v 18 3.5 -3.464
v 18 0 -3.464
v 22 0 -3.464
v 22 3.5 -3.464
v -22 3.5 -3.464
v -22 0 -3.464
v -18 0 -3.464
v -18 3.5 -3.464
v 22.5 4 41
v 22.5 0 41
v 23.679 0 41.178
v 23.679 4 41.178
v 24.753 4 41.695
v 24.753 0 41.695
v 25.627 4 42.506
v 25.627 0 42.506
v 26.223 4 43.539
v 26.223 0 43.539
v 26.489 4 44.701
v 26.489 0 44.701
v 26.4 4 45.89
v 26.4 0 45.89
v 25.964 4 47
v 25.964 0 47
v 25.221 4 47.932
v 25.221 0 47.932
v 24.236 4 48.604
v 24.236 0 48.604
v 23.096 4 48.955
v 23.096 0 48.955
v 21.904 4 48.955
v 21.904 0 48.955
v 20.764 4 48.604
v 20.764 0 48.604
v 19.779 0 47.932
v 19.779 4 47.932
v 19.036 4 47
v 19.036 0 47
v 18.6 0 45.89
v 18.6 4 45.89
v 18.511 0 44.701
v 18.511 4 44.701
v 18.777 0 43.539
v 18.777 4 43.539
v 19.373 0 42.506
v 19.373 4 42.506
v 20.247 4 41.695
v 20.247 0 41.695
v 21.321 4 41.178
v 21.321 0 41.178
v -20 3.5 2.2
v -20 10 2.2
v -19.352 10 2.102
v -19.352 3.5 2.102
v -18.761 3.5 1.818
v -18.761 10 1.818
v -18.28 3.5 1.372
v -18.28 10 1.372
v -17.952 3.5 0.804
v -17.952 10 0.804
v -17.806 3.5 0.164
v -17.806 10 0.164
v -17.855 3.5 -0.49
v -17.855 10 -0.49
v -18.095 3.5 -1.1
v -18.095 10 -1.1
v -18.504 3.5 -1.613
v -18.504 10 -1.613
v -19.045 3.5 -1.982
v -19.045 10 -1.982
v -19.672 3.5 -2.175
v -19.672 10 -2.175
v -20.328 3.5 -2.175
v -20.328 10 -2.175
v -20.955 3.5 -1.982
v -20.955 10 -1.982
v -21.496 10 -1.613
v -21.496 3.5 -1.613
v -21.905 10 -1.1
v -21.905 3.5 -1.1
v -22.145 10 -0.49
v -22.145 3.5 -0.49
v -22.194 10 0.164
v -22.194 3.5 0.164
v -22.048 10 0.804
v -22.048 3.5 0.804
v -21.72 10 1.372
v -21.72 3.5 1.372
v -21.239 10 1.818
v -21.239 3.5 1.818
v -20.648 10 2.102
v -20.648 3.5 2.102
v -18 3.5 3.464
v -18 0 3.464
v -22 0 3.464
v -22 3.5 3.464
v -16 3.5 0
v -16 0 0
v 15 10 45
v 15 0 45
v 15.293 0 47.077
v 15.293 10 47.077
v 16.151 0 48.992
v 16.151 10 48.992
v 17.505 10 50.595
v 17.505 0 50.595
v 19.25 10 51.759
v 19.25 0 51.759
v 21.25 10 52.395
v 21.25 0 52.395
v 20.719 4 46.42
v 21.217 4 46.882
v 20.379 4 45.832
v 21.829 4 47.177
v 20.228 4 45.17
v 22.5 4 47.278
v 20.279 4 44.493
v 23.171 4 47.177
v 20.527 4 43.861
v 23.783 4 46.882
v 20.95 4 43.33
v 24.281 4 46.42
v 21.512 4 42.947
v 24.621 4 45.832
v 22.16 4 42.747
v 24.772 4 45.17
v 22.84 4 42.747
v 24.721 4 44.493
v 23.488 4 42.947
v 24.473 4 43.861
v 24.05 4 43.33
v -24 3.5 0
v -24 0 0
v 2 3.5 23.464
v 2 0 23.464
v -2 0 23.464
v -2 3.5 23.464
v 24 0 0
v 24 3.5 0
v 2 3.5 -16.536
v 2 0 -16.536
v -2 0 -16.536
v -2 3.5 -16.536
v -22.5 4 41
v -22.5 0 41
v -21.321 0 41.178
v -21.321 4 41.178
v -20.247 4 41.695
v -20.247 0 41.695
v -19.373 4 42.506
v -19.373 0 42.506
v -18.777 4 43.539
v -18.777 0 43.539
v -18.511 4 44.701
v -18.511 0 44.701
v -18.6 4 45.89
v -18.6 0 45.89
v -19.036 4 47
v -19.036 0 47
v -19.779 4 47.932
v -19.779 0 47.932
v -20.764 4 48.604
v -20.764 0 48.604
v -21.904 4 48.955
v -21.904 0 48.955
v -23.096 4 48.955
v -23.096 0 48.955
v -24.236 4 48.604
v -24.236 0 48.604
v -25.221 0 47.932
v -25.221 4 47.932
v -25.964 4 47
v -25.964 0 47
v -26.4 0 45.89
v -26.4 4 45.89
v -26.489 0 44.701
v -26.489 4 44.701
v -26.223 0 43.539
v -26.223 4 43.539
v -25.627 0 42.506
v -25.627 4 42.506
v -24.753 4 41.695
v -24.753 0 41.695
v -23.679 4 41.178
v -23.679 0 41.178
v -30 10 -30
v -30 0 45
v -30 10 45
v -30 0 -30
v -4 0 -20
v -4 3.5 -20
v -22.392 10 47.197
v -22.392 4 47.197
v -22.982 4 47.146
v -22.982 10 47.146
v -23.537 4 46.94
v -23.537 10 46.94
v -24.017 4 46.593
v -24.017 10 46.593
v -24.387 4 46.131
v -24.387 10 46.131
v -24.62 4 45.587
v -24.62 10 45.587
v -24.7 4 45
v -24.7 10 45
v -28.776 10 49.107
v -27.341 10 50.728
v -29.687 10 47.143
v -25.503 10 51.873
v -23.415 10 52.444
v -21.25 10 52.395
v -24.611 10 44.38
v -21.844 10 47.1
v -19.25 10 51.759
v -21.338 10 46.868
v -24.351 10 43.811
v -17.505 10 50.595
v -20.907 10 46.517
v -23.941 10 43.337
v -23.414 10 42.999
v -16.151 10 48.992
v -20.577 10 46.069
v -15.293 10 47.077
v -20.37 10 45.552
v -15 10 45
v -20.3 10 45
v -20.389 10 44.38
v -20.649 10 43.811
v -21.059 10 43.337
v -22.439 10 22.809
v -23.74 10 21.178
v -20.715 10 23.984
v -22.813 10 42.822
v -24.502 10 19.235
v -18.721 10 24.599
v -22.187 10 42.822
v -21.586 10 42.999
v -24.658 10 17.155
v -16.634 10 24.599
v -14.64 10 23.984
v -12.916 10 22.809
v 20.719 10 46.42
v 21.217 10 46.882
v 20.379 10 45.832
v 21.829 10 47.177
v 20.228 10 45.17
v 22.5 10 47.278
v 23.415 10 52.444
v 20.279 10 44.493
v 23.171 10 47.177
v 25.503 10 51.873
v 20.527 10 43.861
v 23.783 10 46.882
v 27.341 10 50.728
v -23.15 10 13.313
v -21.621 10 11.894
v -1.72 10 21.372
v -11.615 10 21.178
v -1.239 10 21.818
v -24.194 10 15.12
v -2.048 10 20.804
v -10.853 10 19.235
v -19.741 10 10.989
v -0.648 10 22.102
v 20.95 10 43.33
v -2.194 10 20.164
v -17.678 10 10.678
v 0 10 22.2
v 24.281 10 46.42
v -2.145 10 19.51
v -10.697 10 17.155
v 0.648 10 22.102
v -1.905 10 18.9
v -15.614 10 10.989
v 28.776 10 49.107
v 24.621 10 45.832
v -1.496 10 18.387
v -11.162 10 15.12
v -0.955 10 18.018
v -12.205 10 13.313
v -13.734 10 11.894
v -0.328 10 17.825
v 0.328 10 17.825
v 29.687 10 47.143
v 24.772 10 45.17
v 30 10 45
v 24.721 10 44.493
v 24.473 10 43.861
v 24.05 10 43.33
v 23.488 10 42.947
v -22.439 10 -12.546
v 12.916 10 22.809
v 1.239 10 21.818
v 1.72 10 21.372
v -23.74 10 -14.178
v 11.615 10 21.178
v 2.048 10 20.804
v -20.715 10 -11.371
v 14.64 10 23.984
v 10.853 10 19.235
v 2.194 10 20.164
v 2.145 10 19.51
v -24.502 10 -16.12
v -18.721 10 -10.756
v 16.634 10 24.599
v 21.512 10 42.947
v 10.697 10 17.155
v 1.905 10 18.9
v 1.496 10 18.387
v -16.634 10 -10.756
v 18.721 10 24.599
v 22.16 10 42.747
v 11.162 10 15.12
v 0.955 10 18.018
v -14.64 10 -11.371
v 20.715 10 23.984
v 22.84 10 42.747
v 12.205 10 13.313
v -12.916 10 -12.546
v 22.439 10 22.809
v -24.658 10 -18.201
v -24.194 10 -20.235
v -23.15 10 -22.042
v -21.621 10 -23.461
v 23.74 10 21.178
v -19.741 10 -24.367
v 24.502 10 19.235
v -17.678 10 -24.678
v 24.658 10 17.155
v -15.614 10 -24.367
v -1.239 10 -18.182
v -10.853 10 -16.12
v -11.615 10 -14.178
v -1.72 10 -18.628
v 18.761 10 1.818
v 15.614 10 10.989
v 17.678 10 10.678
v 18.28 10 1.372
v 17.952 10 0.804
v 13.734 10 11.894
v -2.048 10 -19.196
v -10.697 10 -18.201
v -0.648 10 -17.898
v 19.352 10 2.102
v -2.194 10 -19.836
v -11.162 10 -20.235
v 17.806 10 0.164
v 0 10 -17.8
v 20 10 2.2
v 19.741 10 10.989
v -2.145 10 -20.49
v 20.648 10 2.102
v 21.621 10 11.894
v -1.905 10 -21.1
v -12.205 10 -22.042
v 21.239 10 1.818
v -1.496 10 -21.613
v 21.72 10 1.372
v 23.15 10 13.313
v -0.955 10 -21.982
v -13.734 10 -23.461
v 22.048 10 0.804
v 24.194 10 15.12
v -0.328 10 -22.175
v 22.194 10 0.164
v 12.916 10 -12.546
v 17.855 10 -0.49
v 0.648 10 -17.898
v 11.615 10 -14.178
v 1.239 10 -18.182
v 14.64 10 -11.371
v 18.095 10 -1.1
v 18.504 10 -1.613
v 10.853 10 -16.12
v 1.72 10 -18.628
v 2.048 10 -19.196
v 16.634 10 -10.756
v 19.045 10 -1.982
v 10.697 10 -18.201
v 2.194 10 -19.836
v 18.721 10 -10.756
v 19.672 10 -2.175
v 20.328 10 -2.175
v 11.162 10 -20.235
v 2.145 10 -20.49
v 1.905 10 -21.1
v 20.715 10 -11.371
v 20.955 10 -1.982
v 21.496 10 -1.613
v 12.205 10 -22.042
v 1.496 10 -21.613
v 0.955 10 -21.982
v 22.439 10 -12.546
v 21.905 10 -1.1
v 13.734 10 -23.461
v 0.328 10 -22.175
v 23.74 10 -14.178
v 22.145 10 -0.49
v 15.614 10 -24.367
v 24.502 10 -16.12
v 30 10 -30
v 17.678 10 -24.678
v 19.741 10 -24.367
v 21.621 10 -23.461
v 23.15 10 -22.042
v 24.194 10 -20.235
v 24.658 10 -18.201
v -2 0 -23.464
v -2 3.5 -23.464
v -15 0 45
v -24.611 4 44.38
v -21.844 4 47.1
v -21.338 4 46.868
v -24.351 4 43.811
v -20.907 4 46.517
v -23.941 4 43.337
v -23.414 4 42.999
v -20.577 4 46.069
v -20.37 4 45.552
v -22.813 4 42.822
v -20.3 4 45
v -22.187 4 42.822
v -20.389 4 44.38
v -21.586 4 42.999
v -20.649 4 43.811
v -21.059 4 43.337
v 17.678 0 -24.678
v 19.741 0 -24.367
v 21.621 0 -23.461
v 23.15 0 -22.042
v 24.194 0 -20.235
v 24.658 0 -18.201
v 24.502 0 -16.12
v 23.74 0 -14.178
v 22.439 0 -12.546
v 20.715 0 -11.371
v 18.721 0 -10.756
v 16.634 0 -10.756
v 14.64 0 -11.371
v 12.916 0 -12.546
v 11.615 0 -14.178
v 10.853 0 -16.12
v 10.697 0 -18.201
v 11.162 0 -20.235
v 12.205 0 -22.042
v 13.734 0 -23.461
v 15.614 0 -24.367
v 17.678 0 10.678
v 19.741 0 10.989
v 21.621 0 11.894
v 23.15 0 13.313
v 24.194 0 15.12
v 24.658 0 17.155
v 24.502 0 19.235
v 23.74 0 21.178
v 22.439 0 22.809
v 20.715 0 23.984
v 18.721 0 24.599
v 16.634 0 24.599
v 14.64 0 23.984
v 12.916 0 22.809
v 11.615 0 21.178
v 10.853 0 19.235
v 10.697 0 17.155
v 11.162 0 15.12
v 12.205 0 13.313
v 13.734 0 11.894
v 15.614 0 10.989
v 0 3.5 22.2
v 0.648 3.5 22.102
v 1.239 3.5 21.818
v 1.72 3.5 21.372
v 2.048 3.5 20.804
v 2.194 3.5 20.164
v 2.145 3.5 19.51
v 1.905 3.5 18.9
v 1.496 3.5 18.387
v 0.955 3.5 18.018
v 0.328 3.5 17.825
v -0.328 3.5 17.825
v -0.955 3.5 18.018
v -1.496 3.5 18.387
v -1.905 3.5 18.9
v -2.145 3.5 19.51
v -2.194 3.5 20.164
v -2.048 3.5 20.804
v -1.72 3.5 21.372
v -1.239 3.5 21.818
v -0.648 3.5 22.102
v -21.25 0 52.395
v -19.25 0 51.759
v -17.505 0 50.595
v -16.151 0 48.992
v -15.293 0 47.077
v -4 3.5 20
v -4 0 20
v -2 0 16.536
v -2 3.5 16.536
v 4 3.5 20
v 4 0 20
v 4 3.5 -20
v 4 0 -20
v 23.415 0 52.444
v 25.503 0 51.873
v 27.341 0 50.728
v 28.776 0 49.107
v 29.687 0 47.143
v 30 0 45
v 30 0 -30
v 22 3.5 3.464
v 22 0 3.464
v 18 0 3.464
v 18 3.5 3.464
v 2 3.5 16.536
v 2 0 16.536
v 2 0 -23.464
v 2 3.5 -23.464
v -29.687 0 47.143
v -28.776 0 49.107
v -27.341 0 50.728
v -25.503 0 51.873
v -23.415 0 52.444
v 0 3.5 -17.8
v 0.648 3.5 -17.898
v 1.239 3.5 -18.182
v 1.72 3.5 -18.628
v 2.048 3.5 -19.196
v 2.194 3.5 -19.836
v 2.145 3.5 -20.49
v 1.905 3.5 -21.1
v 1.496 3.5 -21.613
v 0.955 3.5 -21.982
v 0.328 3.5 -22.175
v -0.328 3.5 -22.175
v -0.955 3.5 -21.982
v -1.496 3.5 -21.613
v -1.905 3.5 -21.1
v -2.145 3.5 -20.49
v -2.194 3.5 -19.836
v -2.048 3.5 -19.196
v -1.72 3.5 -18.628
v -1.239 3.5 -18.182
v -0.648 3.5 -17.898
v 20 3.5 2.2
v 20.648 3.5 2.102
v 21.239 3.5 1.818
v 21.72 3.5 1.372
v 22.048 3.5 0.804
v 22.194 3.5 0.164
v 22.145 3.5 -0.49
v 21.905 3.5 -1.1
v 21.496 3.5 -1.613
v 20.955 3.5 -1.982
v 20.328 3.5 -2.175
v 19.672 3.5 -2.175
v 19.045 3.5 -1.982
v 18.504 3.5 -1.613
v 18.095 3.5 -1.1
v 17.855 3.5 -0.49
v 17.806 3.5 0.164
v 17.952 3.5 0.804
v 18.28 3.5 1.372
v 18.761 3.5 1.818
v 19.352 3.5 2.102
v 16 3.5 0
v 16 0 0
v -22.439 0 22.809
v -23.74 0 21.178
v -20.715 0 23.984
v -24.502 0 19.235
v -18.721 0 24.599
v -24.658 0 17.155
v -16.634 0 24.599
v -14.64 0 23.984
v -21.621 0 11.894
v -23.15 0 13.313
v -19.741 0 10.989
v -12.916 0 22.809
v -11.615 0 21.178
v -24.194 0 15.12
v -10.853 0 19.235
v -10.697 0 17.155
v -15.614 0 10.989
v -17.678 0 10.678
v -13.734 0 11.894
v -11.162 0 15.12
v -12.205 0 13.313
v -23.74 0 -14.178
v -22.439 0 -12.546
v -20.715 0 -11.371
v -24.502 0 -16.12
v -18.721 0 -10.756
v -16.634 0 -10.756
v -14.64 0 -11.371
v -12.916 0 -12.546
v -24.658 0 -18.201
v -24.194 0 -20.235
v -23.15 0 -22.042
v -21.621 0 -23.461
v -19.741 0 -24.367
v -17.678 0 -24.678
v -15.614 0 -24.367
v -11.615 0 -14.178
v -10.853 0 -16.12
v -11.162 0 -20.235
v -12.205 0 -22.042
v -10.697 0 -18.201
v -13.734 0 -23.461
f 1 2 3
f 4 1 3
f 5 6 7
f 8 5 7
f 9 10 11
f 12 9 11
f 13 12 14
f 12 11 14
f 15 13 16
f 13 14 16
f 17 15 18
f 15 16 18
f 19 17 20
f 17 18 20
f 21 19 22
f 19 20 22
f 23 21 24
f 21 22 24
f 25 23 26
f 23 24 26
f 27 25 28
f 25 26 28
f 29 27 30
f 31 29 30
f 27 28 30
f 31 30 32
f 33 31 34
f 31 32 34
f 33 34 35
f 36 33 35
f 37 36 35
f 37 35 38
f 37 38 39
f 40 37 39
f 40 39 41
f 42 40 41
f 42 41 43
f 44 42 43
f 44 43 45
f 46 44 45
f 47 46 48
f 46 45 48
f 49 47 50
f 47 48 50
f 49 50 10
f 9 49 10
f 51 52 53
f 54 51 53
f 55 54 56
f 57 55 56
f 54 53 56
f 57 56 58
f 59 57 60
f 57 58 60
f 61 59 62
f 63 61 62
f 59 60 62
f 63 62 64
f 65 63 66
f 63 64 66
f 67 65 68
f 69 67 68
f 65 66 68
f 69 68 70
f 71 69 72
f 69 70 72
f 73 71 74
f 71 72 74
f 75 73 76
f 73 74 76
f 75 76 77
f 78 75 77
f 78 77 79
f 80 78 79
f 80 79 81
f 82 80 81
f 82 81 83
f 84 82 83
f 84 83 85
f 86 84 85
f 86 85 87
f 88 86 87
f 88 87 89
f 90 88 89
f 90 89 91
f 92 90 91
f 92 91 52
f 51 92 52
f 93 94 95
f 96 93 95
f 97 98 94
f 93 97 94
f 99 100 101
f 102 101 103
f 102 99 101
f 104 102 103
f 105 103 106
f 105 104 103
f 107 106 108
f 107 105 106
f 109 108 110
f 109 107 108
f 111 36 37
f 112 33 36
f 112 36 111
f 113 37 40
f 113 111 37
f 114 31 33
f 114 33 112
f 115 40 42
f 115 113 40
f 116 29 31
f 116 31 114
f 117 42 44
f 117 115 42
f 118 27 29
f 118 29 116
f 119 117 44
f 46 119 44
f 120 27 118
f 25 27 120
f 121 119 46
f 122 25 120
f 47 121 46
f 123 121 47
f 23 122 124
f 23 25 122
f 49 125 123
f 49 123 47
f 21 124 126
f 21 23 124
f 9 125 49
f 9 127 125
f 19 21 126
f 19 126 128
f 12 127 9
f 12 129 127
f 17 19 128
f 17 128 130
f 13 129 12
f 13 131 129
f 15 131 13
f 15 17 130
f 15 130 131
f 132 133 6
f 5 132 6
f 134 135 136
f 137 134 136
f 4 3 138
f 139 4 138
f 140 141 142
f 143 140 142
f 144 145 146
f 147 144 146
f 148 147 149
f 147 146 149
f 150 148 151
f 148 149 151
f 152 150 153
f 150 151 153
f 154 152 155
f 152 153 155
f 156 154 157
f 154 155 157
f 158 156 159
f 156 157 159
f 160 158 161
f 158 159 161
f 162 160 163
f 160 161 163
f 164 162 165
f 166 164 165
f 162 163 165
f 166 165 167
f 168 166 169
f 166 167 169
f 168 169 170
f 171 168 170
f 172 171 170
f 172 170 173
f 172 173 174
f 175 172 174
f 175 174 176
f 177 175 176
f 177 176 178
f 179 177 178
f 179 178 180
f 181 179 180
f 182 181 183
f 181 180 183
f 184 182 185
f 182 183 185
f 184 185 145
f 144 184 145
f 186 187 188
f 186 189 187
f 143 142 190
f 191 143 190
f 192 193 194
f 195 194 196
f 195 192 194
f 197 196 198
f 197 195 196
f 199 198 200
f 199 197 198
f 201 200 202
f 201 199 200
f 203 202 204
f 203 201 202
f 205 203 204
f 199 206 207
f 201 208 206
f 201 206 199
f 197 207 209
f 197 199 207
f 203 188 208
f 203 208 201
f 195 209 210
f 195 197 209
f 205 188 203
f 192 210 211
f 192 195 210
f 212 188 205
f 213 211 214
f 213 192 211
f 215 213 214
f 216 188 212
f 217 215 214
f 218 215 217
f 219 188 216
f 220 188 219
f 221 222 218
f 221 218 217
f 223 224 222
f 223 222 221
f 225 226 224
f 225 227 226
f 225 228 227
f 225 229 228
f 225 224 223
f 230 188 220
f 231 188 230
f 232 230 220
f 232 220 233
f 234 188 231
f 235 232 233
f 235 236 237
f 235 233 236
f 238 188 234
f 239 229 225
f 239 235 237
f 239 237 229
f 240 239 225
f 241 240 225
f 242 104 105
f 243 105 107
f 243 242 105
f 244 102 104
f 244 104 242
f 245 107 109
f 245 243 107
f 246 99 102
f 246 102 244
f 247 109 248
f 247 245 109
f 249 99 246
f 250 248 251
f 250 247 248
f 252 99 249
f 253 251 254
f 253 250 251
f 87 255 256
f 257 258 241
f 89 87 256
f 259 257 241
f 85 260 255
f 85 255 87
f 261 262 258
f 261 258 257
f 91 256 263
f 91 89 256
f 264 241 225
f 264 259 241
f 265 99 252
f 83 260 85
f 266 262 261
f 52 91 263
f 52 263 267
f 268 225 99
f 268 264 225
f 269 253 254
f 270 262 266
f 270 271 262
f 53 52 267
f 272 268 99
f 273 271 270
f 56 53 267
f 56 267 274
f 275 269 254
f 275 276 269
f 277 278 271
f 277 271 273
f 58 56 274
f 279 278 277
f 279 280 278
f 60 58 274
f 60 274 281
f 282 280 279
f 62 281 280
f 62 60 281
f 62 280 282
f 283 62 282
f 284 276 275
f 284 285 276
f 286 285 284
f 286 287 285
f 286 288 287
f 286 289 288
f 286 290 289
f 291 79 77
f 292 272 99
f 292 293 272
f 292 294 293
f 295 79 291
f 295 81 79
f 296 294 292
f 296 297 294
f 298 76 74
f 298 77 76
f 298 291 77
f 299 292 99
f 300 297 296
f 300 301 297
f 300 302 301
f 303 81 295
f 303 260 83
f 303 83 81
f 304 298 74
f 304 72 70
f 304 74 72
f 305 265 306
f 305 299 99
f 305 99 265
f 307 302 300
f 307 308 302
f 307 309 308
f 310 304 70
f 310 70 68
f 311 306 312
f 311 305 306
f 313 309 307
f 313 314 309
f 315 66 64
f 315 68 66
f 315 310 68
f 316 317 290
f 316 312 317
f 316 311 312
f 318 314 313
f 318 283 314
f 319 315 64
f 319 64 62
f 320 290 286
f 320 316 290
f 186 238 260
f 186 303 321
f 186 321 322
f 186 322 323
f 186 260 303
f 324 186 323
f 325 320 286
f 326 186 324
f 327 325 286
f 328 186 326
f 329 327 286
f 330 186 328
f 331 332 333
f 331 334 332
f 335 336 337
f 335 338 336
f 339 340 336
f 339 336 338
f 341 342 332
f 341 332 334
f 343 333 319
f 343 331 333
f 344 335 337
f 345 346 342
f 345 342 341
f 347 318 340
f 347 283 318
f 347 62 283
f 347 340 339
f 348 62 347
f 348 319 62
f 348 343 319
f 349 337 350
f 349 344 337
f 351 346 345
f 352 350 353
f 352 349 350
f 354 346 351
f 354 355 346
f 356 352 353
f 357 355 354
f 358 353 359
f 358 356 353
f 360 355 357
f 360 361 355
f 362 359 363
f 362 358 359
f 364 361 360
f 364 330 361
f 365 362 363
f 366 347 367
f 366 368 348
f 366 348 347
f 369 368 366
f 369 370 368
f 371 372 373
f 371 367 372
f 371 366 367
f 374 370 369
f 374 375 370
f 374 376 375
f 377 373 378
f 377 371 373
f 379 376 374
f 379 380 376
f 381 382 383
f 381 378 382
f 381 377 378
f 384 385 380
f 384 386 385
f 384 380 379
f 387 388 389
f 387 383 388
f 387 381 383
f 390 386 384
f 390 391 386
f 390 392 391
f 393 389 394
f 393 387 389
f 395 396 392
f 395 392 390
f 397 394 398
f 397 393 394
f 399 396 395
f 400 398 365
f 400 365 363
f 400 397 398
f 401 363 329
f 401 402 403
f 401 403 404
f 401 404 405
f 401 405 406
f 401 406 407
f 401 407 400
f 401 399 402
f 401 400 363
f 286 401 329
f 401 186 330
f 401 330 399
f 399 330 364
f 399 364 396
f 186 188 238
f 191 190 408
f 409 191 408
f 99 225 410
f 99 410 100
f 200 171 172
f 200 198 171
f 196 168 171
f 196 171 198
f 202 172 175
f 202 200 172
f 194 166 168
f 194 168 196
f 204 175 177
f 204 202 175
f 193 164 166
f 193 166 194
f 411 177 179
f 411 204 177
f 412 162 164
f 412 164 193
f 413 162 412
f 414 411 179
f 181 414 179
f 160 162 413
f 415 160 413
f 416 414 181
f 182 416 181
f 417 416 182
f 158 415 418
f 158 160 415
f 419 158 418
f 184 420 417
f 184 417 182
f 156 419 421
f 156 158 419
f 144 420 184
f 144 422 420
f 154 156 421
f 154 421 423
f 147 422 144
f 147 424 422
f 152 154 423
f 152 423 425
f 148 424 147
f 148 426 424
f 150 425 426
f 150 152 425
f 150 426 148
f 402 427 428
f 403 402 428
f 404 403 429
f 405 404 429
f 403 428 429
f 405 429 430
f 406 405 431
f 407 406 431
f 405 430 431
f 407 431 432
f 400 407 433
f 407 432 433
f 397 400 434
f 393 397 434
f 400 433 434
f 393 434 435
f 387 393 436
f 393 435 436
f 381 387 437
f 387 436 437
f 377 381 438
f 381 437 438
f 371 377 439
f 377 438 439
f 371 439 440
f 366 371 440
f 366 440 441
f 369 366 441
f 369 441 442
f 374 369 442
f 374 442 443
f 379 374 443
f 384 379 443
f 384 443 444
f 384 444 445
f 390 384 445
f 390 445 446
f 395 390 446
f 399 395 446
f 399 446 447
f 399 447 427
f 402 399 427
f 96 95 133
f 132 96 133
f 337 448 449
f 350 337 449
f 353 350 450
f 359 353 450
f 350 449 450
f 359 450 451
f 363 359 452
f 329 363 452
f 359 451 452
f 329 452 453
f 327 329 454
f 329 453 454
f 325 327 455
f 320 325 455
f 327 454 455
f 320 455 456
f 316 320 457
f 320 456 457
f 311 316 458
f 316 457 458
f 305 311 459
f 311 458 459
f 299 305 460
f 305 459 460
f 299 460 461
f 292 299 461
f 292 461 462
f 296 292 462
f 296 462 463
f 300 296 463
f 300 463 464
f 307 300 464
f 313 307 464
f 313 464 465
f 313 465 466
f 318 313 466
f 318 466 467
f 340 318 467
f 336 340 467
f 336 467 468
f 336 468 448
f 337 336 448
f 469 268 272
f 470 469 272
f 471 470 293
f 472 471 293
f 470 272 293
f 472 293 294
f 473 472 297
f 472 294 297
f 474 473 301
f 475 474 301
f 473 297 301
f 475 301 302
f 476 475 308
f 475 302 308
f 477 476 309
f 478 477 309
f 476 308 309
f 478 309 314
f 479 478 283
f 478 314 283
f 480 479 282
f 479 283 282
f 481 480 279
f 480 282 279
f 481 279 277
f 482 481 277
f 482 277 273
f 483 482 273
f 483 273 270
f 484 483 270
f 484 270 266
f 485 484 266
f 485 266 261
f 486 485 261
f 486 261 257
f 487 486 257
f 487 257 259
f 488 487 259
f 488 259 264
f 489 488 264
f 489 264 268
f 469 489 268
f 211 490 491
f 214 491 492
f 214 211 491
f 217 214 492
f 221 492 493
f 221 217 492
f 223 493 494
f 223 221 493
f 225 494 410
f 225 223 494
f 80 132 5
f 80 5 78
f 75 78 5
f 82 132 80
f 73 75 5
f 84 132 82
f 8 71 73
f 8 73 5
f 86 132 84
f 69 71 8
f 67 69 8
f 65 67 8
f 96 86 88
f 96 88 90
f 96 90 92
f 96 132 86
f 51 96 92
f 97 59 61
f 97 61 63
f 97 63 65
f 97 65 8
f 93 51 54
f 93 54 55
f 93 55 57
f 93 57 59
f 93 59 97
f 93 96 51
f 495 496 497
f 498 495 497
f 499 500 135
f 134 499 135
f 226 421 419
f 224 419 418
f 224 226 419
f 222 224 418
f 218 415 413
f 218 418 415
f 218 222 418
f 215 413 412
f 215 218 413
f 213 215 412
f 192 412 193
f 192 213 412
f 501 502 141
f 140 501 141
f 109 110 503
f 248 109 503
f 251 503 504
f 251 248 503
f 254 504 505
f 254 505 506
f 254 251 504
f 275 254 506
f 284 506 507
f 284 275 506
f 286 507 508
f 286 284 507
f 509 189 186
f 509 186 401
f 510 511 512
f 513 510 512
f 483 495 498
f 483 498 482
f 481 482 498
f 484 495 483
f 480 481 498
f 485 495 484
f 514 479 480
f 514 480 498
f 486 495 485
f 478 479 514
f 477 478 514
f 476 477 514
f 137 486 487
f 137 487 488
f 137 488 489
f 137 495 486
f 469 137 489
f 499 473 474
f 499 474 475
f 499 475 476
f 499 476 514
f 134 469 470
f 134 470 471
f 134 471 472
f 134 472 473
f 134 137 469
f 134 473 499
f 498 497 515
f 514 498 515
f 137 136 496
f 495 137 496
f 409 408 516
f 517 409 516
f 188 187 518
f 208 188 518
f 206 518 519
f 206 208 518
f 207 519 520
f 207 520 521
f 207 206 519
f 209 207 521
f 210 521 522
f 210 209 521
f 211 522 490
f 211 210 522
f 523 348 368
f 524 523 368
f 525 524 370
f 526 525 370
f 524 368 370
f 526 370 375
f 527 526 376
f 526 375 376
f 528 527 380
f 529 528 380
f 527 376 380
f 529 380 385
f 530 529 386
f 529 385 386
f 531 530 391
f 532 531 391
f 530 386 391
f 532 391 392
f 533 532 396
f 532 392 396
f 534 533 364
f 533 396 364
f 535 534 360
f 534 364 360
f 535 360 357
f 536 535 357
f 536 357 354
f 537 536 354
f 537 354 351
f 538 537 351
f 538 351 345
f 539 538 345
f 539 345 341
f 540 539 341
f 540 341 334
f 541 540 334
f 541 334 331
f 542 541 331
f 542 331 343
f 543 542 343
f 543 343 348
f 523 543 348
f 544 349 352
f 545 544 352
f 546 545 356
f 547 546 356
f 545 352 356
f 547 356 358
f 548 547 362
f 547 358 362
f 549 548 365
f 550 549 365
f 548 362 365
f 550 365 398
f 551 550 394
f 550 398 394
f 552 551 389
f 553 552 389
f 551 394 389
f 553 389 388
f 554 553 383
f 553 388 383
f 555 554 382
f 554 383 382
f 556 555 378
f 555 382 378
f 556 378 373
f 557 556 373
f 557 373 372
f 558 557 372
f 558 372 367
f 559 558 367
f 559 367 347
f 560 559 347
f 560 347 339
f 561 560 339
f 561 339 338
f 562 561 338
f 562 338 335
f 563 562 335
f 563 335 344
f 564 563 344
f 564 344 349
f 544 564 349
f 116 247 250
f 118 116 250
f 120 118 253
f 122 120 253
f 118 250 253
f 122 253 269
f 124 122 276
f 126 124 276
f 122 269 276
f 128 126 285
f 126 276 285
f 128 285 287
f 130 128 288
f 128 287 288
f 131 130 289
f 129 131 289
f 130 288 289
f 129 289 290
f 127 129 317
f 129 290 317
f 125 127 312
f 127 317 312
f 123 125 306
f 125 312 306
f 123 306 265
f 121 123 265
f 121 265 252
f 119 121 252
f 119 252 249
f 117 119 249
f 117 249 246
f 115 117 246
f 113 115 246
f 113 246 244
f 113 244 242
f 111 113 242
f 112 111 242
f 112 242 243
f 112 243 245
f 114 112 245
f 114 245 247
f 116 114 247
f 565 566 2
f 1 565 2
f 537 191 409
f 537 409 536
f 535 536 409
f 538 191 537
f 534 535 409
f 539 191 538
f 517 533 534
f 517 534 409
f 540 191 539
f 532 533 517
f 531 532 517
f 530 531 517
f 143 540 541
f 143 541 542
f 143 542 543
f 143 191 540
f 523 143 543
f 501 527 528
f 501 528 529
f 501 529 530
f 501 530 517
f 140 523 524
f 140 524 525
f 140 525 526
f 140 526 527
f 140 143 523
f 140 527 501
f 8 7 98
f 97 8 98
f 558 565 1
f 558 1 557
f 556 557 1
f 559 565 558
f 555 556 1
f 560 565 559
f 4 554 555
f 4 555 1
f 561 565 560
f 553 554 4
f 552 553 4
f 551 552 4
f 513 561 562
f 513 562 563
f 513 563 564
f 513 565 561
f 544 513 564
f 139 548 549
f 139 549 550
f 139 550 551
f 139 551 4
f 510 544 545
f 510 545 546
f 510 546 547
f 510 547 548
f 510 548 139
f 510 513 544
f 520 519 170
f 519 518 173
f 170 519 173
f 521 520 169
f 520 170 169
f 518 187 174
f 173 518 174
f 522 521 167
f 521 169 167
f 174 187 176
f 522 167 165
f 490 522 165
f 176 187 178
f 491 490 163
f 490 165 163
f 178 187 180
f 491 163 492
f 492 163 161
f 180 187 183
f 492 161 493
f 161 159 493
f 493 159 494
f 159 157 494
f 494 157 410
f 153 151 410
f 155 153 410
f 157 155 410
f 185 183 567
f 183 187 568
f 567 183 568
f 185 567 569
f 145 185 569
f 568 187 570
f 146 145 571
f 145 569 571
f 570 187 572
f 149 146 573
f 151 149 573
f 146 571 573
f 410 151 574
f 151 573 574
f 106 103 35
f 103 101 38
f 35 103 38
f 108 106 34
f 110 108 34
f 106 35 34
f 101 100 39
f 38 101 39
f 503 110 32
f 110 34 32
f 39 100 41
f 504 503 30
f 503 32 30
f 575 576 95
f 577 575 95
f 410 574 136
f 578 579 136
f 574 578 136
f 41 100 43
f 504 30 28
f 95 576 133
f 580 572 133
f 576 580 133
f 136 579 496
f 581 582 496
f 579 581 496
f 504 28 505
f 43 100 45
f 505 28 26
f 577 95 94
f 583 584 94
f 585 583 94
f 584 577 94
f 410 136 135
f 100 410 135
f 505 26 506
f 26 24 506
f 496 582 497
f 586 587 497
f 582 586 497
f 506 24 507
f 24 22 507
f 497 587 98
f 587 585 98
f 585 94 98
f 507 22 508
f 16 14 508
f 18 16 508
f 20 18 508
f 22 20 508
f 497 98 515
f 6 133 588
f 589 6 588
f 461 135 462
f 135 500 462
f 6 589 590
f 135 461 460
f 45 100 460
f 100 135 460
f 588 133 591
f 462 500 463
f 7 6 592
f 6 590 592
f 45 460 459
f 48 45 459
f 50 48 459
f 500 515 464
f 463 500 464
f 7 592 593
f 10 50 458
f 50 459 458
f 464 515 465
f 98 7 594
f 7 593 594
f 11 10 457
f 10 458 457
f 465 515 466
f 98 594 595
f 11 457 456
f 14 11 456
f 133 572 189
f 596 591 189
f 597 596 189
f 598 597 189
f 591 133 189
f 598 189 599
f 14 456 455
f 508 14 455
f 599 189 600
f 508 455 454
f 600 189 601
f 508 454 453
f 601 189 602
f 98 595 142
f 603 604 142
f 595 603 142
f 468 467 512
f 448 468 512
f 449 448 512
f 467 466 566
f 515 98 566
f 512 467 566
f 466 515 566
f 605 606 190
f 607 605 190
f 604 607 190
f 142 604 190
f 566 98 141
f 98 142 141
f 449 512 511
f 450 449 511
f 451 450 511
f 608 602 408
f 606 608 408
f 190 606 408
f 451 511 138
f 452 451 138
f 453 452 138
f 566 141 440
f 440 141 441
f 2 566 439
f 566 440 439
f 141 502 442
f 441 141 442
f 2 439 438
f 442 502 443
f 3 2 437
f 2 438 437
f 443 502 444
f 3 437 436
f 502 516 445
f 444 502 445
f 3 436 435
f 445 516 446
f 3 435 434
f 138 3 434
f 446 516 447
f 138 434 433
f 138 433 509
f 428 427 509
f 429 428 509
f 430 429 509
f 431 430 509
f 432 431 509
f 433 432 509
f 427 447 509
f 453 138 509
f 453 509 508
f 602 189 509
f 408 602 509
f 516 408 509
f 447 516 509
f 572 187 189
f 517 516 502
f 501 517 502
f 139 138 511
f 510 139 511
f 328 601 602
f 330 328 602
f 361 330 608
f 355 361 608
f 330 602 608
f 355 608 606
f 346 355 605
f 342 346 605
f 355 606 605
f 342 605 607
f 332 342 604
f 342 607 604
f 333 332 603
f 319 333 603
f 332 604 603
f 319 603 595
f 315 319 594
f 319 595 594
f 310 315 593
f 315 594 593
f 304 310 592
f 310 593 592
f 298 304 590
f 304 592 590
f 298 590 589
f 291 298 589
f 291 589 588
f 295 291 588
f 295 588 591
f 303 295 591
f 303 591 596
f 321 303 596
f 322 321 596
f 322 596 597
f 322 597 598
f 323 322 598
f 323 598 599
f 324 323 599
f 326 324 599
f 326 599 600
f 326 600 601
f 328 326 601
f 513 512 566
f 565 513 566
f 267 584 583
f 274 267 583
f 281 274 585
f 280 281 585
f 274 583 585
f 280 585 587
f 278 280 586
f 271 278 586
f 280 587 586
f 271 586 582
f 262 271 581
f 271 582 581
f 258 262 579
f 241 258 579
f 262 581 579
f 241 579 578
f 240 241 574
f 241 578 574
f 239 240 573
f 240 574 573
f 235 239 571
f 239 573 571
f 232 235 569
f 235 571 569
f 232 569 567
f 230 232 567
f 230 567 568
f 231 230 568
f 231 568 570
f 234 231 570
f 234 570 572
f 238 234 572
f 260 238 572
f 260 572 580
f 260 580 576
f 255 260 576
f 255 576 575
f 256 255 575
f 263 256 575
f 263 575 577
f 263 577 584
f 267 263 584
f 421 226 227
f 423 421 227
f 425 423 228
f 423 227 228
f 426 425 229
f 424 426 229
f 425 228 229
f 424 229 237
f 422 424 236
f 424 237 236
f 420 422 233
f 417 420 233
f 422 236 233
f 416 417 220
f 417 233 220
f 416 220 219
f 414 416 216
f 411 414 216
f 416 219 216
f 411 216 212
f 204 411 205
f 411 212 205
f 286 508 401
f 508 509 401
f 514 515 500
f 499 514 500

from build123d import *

# Parameters (mm, degrees)
SKETCH_1_W          = 60
SKETCH_1_H          = 60
EXTRUDE_1_DEPTH     = 10
SKETCH_2_R          = 2.2
CUT_EXTRUDE_1_DEPTH = 10
CUT_EXTRUDE_2_DEPTH = 3.5
SKETCH_4_R          = 7
CUT_EXTRUDE_3_DEPTH = 44.588989435
SKETCH_5_W          = 60
SKETCH_5_H          = 10
EXTRUDE_2_DEPTH     = 15
EXTRUDE_3_DEPTH     = 10
SKETCH_7_R          = 2.27814783
SKETCH_7_R_2        = 2.2
CUT_EXTRUDE_4_DEPTH = 62.288253361
SKETCH_8_R          = 4
CUT_EXTRUDE_5_DEPTH = 4


with BuildPart() as part:
    # 草图1 → 凸台-拉伸1 (new body)
    with BuildSketch(Plane(origin=(0, 0, 0), x_dir=(1, 0, 0), z_dir=(0, 1, 0))):
        Rectangle(SKETCH_1_W, SKETCH_1_H)
    extrude(amount=EXTRUDE_1_DEPTH)

    # 草图2 → 切除-拉伸1 (cut)
    with BuildSketch(Plane(origin=(0, 10, 0), x_dir=(1, 0, 0), z_dir=(0, 1, 0))):
        with Locations(Location((0, 20, 0), (0, 0, 270))):
            Circle(SKETCH_2_R)
        with Locations(Location((-20, 0, 0), (0, 0, 270))):
            Circle(SKETCH_2_R)
        with Locations(Location((0, -20, 0), (0, 0, 270))):
            Circle(SKETCH_2_R)
        with Locations(Location((20, 0, 0), (0, 0, 270))):
            Circle(SKETCH_2_R)
    extrude(amount=-CUT_EXTRUDE_1_DEPTH, mode=Mode.SUBTRACT)

    # 草图3 → 切除-拉伸2 (cut)
    with BuildSketch(Plane.XZ):
        Polygon((4, 20), (2, 23.464101615), (-2, 23.464101615), (-4, 20), (-2, 16.535898385), (2, 16.535898385), align=None)
        Polygon((-16, 0), (-18, 3.464101615), (-22, 3.464101615), (-24, 0), (-22, -3.464101615), (-18, -3.464101615), align=None)
        Polygon((24, 0), (22, 3.464101615), (18, 3.464101615), (16, 0), (18, -3.464101615), (22, -3.464101615), align=None)
        Polygon((4, -20), (2, -16.535898385), (-2, -16.535898385), (-4, -20), (-2, -23.464101615), (2, -23.464101615), align=None)
    extrude(amount=-CUT_EXTRUDE_2_DEPTH, mode=Mode.SUBTRACT)

    # 草图4 → 切除-拉伸3 (cut, through all)
    with BuildSketch(Plane.XZ):
        with Locations(Location((-17.67766953, 17.67766953, 0), (0, 0, 270))):
            Circle(SKETCH_4_R)
        with Locations(Location((-17.67766953, -17.67766953, 0), (0, 0, 270))):
            Circle(SKETCH_4_R)
        with Locations(Location((17.67766953, -17.67766953, 0), (0, 0, 270))):
            Circle(SKETCH_4_R)
        with Locations(Location((17.67766953, 17.67766953, 0), (0, 0, 270))):
            Circle(SKETCH_4_R)
    extrude(amount=-CUT_EXTRUDE_3_DEPTH, mode=Mode.SUBTRACT)

    # 草图5 → 凸台-拉伸2 (add)
    with BuildSketch(Plane.XY.offset(30)):
        with Locations((0, 5)):
            Rectangle(SKETCH_5_W, SKETCH_5_H)
    extrude(amount=EXTRUDE_2_DEPTH)

    # 草图6 → 凸台-拉伸3 (add)
    with BuildSketch(Plane(origin=(0, 10, 0), x_dir=(1, 0, 0), z_dir=(0, 1, 0))):
        with BuildLine():
            ThreePointArc((-30, -45), (-27.341229183, -50.728219619), (-21.25, -52.395099729))
            ThreePointArc((-21.25, -52.395099729), (-21.97543719, -49.830130464), (-22.392444444, -47.197369291))
            ThreePointArc((-22.392444444, -47.197369291), (-24.017131797, -46.593207805), (-24.7, -45))
            Line((-24.7, -45), (-30, -45))
        make_face()
        with BuildLine():
            ThreePointArc((-22.392444444, -47.197369291), (-21.97543719, -49.830130464), (-21.25, -52.395099729))
            ThreePointArc((-21.25, -52.395099729), (-16.771780381, -49.841229183), (-15, -45))
            Line((-15, -45), (-20.3, -45))
            ThreePointArc((-20.3, -45), (-20.906792195, -46.517131797), (-22.392444444, -47.197369291))
        make_face()
        with BuildLine():
            Line((-20.3, -45), (-15, -45))
            ThreePointArc((-15, -45), (-16.771780381, -40.158770817), (-21.25, -37.604900271))
            ThreePointArc((-21.25, -37.604900271), (-21.97543719, -40.169869536), (-22.392444444, -42.802630709))
            ThreePointArc((-22.392444444, -42.802630709), (-20.906792195, -43.482868203), (-20.3, -45))
        make_face()
        with BuildLine():
            ThreePointArc((-21.25, -37.604900271), (-27.341229183, -39.271780381), (-30, -45))
            Line((-30, -45), (-24.7, -45))
            ThreePointArc((-24.7, -45), (-24.017131797, -43.406792195), (-22.392444444, -42.802630709))
            ThreePointArc((-22.392444444, -42.802630709), (-21.97543719, -40.169869536), (-21.25, -37.604900271))
        make_face()
        with BuildLine():
            ThreePointArc((21.25, -52.395099729), (27.341229183, -50.728219619), (30, -45))
            Line((30, -45), (24.7, -45))
            ThreePointArc((24.7, -45), (24.017131797, -46.593207805), (22.392444444, -47.197369291))
            ThreePointArc((22.392444444, -47.197369291), (21.97543719, -49.830130464), (21.25, -52.395099729))
        make_face()
        with BuildLine():
            Line((24.7, -45), (30, -45))
            ThreePointArc((30, -45), (27.341229183, -39.271780381), (21.25, -37.604900271))
            ThreePointArc((21.25, -37.604900271), (21.97543719, -40.169869536), (22.392444444, -42.802630709))
            ThreePointArc((22.392444444, -42.802630709), (24.017131797, -43.406792195), (24.7, -45))
        make_face()
        with BuildLine():
            ThreePointArc((22.392444444, -42.802630709), (21.97543719, -40.169869536), (21.25, -37.604900271))
            ThreePointArc((21.25, -37.604900271), (16.771780381, -40.158770817), (15, -45))
            Line((15, -45), (20.3, -45))
            ThreePointArc((20.3, -45), (20.906792195, -43.482868203), (22.392444444, -42.802630709))
        make_face()
        with BuildLine():
            ThreePointArc((15, -45), (16.771780381, -49.841229183), (21.25, -52.395099729))
            ThreePointArc((21.25, -52.395099729), (21.97543719, -49.830130464), (22.392444444, -47.197369291))
            ThreePointArc((22.392444444, -47.197369291), (20.906792195, -46.517131797), (20.3, -45))
            Line((20.3, -45), (15, -45))
        make_face()
    extrude(amount=-EXTRUDE_3_DEPTH)

    # 草图7 → 切除-拉伸4 (cut, through all)
    with BuildSketch(Plane(origin=(0, 10, 0), x_dir=(1, 0, 0), z_dir=(0, 1, 0))):
        with Locations(Location((22.5, -45, 0), (0, 0, 270))):
            Circle(SKETCH_7_R)
        with Locations(Location((-22.5, -45, 0), (0, 0, 270))):
            Circle(SKETCH_7_R_2)
    extrude(amount=-CUT_EXTRUDE_4_DEPTH, mode=Mode.SUBTRACT)

    # 草图8 → 切除-拉伸5 (cut)
    with BuildSketch(Plane(origin=(0, 0, 0), x_dir=(-1, 0, 0), z_dir=(0, -1, 0))):
        with Locations(Location((-22.5, -45, 0), (0, 0, 90))):
            Circle(SKETCH_8_R)
        with Locations(Location((22.5, -45, 0), (0, 0, 90))):
            Circle(SKETCH_8_R)
    extrude(amount=-CUT_EXTRUDE_5_DEPTH, mode=Mode.SUBTRACT)


solid = part.part
